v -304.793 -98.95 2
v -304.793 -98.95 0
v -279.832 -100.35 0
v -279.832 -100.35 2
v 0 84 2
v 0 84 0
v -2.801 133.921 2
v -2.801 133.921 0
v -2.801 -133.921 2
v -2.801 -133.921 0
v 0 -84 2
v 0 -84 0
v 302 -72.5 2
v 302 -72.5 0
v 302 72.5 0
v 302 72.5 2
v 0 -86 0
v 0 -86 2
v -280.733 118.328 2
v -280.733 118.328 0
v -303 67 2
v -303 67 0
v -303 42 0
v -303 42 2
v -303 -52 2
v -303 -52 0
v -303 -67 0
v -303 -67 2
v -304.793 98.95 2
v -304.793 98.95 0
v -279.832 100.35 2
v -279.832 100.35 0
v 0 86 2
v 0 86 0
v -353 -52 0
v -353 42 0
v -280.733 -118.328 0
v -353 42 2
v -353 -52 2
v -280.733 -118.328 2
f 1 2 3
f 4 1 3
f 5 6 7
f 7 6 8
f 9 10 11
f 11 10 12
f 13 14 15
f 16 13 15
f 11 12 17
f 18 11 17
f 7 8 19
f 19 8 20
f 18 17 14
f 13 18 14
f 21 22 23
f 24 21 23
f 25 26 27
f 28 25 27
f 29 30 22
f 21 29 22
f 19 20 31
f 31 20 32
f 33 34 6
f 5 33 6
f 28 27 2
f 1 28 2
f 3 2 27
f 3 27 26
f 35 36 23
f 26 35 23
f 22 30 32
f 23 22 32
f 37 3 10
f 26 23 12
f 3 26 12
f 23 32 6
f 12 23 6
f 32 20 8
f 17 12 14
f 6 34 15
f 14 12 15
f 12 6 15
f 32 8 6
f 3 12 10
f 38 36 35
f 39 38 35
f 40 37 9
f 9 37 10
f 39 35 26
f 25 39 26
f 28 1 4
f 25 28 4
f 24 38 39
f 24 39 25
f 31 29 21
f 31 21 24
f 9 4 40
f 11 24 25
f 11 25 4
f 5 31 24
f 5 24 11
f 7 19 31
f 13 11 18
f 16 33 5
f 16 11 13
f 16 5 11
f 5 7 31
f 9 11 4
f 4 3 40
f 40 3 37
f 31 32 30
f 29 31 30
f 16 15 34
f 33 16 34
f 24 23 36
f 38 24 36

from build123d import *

# Parameters (mm, degrees)
F1_DEPTH = 2


with BuildPart() as f1:
    # F0 (on Top) → F1 (new body)
    with BuildSketch(Plane.XY):
        Polygon((302, 72.5), (275, 73.7069536424), (275, 0), (275, -73.7069536424), (302, -72.5), (302, 0), align=None)
        Polygon((0, 84), (0, 0), (0, -84), (0, -86), (275, -73.7069536424), (275, 0), (275, 73.7069536424), (0, 86), align=None)
        Polygon((0, -84), (0, 0), (0, 84), (-303, 67), (-303, 42), (-303, 0), (-303, -52), (-303, -67), align=None)
        Polygon((-2.8008756383, -133.9214893173), (0, -84), (-303, -67), (-304.7925604085, -98.9497531631), (-279.8318157498, -100.3501909822), (-280.7333549372, -118.3279178715), align=None)
        Polygon((-303, 67), (0, 84), (-2.8008756383, 133.9214893173), (-280.7333549372, 118.3279178715), (-279.8318157498, 100.3501909822), (-304.7925604085, 98.9497531631), align=None)
        Polygon((-303, 0), (-303, 42), (-353, 42), (-353, 0), (-353, -52), (-303, -52), align=None)
    extrude(amount=F1_DEPTH)


solid = f1.part
